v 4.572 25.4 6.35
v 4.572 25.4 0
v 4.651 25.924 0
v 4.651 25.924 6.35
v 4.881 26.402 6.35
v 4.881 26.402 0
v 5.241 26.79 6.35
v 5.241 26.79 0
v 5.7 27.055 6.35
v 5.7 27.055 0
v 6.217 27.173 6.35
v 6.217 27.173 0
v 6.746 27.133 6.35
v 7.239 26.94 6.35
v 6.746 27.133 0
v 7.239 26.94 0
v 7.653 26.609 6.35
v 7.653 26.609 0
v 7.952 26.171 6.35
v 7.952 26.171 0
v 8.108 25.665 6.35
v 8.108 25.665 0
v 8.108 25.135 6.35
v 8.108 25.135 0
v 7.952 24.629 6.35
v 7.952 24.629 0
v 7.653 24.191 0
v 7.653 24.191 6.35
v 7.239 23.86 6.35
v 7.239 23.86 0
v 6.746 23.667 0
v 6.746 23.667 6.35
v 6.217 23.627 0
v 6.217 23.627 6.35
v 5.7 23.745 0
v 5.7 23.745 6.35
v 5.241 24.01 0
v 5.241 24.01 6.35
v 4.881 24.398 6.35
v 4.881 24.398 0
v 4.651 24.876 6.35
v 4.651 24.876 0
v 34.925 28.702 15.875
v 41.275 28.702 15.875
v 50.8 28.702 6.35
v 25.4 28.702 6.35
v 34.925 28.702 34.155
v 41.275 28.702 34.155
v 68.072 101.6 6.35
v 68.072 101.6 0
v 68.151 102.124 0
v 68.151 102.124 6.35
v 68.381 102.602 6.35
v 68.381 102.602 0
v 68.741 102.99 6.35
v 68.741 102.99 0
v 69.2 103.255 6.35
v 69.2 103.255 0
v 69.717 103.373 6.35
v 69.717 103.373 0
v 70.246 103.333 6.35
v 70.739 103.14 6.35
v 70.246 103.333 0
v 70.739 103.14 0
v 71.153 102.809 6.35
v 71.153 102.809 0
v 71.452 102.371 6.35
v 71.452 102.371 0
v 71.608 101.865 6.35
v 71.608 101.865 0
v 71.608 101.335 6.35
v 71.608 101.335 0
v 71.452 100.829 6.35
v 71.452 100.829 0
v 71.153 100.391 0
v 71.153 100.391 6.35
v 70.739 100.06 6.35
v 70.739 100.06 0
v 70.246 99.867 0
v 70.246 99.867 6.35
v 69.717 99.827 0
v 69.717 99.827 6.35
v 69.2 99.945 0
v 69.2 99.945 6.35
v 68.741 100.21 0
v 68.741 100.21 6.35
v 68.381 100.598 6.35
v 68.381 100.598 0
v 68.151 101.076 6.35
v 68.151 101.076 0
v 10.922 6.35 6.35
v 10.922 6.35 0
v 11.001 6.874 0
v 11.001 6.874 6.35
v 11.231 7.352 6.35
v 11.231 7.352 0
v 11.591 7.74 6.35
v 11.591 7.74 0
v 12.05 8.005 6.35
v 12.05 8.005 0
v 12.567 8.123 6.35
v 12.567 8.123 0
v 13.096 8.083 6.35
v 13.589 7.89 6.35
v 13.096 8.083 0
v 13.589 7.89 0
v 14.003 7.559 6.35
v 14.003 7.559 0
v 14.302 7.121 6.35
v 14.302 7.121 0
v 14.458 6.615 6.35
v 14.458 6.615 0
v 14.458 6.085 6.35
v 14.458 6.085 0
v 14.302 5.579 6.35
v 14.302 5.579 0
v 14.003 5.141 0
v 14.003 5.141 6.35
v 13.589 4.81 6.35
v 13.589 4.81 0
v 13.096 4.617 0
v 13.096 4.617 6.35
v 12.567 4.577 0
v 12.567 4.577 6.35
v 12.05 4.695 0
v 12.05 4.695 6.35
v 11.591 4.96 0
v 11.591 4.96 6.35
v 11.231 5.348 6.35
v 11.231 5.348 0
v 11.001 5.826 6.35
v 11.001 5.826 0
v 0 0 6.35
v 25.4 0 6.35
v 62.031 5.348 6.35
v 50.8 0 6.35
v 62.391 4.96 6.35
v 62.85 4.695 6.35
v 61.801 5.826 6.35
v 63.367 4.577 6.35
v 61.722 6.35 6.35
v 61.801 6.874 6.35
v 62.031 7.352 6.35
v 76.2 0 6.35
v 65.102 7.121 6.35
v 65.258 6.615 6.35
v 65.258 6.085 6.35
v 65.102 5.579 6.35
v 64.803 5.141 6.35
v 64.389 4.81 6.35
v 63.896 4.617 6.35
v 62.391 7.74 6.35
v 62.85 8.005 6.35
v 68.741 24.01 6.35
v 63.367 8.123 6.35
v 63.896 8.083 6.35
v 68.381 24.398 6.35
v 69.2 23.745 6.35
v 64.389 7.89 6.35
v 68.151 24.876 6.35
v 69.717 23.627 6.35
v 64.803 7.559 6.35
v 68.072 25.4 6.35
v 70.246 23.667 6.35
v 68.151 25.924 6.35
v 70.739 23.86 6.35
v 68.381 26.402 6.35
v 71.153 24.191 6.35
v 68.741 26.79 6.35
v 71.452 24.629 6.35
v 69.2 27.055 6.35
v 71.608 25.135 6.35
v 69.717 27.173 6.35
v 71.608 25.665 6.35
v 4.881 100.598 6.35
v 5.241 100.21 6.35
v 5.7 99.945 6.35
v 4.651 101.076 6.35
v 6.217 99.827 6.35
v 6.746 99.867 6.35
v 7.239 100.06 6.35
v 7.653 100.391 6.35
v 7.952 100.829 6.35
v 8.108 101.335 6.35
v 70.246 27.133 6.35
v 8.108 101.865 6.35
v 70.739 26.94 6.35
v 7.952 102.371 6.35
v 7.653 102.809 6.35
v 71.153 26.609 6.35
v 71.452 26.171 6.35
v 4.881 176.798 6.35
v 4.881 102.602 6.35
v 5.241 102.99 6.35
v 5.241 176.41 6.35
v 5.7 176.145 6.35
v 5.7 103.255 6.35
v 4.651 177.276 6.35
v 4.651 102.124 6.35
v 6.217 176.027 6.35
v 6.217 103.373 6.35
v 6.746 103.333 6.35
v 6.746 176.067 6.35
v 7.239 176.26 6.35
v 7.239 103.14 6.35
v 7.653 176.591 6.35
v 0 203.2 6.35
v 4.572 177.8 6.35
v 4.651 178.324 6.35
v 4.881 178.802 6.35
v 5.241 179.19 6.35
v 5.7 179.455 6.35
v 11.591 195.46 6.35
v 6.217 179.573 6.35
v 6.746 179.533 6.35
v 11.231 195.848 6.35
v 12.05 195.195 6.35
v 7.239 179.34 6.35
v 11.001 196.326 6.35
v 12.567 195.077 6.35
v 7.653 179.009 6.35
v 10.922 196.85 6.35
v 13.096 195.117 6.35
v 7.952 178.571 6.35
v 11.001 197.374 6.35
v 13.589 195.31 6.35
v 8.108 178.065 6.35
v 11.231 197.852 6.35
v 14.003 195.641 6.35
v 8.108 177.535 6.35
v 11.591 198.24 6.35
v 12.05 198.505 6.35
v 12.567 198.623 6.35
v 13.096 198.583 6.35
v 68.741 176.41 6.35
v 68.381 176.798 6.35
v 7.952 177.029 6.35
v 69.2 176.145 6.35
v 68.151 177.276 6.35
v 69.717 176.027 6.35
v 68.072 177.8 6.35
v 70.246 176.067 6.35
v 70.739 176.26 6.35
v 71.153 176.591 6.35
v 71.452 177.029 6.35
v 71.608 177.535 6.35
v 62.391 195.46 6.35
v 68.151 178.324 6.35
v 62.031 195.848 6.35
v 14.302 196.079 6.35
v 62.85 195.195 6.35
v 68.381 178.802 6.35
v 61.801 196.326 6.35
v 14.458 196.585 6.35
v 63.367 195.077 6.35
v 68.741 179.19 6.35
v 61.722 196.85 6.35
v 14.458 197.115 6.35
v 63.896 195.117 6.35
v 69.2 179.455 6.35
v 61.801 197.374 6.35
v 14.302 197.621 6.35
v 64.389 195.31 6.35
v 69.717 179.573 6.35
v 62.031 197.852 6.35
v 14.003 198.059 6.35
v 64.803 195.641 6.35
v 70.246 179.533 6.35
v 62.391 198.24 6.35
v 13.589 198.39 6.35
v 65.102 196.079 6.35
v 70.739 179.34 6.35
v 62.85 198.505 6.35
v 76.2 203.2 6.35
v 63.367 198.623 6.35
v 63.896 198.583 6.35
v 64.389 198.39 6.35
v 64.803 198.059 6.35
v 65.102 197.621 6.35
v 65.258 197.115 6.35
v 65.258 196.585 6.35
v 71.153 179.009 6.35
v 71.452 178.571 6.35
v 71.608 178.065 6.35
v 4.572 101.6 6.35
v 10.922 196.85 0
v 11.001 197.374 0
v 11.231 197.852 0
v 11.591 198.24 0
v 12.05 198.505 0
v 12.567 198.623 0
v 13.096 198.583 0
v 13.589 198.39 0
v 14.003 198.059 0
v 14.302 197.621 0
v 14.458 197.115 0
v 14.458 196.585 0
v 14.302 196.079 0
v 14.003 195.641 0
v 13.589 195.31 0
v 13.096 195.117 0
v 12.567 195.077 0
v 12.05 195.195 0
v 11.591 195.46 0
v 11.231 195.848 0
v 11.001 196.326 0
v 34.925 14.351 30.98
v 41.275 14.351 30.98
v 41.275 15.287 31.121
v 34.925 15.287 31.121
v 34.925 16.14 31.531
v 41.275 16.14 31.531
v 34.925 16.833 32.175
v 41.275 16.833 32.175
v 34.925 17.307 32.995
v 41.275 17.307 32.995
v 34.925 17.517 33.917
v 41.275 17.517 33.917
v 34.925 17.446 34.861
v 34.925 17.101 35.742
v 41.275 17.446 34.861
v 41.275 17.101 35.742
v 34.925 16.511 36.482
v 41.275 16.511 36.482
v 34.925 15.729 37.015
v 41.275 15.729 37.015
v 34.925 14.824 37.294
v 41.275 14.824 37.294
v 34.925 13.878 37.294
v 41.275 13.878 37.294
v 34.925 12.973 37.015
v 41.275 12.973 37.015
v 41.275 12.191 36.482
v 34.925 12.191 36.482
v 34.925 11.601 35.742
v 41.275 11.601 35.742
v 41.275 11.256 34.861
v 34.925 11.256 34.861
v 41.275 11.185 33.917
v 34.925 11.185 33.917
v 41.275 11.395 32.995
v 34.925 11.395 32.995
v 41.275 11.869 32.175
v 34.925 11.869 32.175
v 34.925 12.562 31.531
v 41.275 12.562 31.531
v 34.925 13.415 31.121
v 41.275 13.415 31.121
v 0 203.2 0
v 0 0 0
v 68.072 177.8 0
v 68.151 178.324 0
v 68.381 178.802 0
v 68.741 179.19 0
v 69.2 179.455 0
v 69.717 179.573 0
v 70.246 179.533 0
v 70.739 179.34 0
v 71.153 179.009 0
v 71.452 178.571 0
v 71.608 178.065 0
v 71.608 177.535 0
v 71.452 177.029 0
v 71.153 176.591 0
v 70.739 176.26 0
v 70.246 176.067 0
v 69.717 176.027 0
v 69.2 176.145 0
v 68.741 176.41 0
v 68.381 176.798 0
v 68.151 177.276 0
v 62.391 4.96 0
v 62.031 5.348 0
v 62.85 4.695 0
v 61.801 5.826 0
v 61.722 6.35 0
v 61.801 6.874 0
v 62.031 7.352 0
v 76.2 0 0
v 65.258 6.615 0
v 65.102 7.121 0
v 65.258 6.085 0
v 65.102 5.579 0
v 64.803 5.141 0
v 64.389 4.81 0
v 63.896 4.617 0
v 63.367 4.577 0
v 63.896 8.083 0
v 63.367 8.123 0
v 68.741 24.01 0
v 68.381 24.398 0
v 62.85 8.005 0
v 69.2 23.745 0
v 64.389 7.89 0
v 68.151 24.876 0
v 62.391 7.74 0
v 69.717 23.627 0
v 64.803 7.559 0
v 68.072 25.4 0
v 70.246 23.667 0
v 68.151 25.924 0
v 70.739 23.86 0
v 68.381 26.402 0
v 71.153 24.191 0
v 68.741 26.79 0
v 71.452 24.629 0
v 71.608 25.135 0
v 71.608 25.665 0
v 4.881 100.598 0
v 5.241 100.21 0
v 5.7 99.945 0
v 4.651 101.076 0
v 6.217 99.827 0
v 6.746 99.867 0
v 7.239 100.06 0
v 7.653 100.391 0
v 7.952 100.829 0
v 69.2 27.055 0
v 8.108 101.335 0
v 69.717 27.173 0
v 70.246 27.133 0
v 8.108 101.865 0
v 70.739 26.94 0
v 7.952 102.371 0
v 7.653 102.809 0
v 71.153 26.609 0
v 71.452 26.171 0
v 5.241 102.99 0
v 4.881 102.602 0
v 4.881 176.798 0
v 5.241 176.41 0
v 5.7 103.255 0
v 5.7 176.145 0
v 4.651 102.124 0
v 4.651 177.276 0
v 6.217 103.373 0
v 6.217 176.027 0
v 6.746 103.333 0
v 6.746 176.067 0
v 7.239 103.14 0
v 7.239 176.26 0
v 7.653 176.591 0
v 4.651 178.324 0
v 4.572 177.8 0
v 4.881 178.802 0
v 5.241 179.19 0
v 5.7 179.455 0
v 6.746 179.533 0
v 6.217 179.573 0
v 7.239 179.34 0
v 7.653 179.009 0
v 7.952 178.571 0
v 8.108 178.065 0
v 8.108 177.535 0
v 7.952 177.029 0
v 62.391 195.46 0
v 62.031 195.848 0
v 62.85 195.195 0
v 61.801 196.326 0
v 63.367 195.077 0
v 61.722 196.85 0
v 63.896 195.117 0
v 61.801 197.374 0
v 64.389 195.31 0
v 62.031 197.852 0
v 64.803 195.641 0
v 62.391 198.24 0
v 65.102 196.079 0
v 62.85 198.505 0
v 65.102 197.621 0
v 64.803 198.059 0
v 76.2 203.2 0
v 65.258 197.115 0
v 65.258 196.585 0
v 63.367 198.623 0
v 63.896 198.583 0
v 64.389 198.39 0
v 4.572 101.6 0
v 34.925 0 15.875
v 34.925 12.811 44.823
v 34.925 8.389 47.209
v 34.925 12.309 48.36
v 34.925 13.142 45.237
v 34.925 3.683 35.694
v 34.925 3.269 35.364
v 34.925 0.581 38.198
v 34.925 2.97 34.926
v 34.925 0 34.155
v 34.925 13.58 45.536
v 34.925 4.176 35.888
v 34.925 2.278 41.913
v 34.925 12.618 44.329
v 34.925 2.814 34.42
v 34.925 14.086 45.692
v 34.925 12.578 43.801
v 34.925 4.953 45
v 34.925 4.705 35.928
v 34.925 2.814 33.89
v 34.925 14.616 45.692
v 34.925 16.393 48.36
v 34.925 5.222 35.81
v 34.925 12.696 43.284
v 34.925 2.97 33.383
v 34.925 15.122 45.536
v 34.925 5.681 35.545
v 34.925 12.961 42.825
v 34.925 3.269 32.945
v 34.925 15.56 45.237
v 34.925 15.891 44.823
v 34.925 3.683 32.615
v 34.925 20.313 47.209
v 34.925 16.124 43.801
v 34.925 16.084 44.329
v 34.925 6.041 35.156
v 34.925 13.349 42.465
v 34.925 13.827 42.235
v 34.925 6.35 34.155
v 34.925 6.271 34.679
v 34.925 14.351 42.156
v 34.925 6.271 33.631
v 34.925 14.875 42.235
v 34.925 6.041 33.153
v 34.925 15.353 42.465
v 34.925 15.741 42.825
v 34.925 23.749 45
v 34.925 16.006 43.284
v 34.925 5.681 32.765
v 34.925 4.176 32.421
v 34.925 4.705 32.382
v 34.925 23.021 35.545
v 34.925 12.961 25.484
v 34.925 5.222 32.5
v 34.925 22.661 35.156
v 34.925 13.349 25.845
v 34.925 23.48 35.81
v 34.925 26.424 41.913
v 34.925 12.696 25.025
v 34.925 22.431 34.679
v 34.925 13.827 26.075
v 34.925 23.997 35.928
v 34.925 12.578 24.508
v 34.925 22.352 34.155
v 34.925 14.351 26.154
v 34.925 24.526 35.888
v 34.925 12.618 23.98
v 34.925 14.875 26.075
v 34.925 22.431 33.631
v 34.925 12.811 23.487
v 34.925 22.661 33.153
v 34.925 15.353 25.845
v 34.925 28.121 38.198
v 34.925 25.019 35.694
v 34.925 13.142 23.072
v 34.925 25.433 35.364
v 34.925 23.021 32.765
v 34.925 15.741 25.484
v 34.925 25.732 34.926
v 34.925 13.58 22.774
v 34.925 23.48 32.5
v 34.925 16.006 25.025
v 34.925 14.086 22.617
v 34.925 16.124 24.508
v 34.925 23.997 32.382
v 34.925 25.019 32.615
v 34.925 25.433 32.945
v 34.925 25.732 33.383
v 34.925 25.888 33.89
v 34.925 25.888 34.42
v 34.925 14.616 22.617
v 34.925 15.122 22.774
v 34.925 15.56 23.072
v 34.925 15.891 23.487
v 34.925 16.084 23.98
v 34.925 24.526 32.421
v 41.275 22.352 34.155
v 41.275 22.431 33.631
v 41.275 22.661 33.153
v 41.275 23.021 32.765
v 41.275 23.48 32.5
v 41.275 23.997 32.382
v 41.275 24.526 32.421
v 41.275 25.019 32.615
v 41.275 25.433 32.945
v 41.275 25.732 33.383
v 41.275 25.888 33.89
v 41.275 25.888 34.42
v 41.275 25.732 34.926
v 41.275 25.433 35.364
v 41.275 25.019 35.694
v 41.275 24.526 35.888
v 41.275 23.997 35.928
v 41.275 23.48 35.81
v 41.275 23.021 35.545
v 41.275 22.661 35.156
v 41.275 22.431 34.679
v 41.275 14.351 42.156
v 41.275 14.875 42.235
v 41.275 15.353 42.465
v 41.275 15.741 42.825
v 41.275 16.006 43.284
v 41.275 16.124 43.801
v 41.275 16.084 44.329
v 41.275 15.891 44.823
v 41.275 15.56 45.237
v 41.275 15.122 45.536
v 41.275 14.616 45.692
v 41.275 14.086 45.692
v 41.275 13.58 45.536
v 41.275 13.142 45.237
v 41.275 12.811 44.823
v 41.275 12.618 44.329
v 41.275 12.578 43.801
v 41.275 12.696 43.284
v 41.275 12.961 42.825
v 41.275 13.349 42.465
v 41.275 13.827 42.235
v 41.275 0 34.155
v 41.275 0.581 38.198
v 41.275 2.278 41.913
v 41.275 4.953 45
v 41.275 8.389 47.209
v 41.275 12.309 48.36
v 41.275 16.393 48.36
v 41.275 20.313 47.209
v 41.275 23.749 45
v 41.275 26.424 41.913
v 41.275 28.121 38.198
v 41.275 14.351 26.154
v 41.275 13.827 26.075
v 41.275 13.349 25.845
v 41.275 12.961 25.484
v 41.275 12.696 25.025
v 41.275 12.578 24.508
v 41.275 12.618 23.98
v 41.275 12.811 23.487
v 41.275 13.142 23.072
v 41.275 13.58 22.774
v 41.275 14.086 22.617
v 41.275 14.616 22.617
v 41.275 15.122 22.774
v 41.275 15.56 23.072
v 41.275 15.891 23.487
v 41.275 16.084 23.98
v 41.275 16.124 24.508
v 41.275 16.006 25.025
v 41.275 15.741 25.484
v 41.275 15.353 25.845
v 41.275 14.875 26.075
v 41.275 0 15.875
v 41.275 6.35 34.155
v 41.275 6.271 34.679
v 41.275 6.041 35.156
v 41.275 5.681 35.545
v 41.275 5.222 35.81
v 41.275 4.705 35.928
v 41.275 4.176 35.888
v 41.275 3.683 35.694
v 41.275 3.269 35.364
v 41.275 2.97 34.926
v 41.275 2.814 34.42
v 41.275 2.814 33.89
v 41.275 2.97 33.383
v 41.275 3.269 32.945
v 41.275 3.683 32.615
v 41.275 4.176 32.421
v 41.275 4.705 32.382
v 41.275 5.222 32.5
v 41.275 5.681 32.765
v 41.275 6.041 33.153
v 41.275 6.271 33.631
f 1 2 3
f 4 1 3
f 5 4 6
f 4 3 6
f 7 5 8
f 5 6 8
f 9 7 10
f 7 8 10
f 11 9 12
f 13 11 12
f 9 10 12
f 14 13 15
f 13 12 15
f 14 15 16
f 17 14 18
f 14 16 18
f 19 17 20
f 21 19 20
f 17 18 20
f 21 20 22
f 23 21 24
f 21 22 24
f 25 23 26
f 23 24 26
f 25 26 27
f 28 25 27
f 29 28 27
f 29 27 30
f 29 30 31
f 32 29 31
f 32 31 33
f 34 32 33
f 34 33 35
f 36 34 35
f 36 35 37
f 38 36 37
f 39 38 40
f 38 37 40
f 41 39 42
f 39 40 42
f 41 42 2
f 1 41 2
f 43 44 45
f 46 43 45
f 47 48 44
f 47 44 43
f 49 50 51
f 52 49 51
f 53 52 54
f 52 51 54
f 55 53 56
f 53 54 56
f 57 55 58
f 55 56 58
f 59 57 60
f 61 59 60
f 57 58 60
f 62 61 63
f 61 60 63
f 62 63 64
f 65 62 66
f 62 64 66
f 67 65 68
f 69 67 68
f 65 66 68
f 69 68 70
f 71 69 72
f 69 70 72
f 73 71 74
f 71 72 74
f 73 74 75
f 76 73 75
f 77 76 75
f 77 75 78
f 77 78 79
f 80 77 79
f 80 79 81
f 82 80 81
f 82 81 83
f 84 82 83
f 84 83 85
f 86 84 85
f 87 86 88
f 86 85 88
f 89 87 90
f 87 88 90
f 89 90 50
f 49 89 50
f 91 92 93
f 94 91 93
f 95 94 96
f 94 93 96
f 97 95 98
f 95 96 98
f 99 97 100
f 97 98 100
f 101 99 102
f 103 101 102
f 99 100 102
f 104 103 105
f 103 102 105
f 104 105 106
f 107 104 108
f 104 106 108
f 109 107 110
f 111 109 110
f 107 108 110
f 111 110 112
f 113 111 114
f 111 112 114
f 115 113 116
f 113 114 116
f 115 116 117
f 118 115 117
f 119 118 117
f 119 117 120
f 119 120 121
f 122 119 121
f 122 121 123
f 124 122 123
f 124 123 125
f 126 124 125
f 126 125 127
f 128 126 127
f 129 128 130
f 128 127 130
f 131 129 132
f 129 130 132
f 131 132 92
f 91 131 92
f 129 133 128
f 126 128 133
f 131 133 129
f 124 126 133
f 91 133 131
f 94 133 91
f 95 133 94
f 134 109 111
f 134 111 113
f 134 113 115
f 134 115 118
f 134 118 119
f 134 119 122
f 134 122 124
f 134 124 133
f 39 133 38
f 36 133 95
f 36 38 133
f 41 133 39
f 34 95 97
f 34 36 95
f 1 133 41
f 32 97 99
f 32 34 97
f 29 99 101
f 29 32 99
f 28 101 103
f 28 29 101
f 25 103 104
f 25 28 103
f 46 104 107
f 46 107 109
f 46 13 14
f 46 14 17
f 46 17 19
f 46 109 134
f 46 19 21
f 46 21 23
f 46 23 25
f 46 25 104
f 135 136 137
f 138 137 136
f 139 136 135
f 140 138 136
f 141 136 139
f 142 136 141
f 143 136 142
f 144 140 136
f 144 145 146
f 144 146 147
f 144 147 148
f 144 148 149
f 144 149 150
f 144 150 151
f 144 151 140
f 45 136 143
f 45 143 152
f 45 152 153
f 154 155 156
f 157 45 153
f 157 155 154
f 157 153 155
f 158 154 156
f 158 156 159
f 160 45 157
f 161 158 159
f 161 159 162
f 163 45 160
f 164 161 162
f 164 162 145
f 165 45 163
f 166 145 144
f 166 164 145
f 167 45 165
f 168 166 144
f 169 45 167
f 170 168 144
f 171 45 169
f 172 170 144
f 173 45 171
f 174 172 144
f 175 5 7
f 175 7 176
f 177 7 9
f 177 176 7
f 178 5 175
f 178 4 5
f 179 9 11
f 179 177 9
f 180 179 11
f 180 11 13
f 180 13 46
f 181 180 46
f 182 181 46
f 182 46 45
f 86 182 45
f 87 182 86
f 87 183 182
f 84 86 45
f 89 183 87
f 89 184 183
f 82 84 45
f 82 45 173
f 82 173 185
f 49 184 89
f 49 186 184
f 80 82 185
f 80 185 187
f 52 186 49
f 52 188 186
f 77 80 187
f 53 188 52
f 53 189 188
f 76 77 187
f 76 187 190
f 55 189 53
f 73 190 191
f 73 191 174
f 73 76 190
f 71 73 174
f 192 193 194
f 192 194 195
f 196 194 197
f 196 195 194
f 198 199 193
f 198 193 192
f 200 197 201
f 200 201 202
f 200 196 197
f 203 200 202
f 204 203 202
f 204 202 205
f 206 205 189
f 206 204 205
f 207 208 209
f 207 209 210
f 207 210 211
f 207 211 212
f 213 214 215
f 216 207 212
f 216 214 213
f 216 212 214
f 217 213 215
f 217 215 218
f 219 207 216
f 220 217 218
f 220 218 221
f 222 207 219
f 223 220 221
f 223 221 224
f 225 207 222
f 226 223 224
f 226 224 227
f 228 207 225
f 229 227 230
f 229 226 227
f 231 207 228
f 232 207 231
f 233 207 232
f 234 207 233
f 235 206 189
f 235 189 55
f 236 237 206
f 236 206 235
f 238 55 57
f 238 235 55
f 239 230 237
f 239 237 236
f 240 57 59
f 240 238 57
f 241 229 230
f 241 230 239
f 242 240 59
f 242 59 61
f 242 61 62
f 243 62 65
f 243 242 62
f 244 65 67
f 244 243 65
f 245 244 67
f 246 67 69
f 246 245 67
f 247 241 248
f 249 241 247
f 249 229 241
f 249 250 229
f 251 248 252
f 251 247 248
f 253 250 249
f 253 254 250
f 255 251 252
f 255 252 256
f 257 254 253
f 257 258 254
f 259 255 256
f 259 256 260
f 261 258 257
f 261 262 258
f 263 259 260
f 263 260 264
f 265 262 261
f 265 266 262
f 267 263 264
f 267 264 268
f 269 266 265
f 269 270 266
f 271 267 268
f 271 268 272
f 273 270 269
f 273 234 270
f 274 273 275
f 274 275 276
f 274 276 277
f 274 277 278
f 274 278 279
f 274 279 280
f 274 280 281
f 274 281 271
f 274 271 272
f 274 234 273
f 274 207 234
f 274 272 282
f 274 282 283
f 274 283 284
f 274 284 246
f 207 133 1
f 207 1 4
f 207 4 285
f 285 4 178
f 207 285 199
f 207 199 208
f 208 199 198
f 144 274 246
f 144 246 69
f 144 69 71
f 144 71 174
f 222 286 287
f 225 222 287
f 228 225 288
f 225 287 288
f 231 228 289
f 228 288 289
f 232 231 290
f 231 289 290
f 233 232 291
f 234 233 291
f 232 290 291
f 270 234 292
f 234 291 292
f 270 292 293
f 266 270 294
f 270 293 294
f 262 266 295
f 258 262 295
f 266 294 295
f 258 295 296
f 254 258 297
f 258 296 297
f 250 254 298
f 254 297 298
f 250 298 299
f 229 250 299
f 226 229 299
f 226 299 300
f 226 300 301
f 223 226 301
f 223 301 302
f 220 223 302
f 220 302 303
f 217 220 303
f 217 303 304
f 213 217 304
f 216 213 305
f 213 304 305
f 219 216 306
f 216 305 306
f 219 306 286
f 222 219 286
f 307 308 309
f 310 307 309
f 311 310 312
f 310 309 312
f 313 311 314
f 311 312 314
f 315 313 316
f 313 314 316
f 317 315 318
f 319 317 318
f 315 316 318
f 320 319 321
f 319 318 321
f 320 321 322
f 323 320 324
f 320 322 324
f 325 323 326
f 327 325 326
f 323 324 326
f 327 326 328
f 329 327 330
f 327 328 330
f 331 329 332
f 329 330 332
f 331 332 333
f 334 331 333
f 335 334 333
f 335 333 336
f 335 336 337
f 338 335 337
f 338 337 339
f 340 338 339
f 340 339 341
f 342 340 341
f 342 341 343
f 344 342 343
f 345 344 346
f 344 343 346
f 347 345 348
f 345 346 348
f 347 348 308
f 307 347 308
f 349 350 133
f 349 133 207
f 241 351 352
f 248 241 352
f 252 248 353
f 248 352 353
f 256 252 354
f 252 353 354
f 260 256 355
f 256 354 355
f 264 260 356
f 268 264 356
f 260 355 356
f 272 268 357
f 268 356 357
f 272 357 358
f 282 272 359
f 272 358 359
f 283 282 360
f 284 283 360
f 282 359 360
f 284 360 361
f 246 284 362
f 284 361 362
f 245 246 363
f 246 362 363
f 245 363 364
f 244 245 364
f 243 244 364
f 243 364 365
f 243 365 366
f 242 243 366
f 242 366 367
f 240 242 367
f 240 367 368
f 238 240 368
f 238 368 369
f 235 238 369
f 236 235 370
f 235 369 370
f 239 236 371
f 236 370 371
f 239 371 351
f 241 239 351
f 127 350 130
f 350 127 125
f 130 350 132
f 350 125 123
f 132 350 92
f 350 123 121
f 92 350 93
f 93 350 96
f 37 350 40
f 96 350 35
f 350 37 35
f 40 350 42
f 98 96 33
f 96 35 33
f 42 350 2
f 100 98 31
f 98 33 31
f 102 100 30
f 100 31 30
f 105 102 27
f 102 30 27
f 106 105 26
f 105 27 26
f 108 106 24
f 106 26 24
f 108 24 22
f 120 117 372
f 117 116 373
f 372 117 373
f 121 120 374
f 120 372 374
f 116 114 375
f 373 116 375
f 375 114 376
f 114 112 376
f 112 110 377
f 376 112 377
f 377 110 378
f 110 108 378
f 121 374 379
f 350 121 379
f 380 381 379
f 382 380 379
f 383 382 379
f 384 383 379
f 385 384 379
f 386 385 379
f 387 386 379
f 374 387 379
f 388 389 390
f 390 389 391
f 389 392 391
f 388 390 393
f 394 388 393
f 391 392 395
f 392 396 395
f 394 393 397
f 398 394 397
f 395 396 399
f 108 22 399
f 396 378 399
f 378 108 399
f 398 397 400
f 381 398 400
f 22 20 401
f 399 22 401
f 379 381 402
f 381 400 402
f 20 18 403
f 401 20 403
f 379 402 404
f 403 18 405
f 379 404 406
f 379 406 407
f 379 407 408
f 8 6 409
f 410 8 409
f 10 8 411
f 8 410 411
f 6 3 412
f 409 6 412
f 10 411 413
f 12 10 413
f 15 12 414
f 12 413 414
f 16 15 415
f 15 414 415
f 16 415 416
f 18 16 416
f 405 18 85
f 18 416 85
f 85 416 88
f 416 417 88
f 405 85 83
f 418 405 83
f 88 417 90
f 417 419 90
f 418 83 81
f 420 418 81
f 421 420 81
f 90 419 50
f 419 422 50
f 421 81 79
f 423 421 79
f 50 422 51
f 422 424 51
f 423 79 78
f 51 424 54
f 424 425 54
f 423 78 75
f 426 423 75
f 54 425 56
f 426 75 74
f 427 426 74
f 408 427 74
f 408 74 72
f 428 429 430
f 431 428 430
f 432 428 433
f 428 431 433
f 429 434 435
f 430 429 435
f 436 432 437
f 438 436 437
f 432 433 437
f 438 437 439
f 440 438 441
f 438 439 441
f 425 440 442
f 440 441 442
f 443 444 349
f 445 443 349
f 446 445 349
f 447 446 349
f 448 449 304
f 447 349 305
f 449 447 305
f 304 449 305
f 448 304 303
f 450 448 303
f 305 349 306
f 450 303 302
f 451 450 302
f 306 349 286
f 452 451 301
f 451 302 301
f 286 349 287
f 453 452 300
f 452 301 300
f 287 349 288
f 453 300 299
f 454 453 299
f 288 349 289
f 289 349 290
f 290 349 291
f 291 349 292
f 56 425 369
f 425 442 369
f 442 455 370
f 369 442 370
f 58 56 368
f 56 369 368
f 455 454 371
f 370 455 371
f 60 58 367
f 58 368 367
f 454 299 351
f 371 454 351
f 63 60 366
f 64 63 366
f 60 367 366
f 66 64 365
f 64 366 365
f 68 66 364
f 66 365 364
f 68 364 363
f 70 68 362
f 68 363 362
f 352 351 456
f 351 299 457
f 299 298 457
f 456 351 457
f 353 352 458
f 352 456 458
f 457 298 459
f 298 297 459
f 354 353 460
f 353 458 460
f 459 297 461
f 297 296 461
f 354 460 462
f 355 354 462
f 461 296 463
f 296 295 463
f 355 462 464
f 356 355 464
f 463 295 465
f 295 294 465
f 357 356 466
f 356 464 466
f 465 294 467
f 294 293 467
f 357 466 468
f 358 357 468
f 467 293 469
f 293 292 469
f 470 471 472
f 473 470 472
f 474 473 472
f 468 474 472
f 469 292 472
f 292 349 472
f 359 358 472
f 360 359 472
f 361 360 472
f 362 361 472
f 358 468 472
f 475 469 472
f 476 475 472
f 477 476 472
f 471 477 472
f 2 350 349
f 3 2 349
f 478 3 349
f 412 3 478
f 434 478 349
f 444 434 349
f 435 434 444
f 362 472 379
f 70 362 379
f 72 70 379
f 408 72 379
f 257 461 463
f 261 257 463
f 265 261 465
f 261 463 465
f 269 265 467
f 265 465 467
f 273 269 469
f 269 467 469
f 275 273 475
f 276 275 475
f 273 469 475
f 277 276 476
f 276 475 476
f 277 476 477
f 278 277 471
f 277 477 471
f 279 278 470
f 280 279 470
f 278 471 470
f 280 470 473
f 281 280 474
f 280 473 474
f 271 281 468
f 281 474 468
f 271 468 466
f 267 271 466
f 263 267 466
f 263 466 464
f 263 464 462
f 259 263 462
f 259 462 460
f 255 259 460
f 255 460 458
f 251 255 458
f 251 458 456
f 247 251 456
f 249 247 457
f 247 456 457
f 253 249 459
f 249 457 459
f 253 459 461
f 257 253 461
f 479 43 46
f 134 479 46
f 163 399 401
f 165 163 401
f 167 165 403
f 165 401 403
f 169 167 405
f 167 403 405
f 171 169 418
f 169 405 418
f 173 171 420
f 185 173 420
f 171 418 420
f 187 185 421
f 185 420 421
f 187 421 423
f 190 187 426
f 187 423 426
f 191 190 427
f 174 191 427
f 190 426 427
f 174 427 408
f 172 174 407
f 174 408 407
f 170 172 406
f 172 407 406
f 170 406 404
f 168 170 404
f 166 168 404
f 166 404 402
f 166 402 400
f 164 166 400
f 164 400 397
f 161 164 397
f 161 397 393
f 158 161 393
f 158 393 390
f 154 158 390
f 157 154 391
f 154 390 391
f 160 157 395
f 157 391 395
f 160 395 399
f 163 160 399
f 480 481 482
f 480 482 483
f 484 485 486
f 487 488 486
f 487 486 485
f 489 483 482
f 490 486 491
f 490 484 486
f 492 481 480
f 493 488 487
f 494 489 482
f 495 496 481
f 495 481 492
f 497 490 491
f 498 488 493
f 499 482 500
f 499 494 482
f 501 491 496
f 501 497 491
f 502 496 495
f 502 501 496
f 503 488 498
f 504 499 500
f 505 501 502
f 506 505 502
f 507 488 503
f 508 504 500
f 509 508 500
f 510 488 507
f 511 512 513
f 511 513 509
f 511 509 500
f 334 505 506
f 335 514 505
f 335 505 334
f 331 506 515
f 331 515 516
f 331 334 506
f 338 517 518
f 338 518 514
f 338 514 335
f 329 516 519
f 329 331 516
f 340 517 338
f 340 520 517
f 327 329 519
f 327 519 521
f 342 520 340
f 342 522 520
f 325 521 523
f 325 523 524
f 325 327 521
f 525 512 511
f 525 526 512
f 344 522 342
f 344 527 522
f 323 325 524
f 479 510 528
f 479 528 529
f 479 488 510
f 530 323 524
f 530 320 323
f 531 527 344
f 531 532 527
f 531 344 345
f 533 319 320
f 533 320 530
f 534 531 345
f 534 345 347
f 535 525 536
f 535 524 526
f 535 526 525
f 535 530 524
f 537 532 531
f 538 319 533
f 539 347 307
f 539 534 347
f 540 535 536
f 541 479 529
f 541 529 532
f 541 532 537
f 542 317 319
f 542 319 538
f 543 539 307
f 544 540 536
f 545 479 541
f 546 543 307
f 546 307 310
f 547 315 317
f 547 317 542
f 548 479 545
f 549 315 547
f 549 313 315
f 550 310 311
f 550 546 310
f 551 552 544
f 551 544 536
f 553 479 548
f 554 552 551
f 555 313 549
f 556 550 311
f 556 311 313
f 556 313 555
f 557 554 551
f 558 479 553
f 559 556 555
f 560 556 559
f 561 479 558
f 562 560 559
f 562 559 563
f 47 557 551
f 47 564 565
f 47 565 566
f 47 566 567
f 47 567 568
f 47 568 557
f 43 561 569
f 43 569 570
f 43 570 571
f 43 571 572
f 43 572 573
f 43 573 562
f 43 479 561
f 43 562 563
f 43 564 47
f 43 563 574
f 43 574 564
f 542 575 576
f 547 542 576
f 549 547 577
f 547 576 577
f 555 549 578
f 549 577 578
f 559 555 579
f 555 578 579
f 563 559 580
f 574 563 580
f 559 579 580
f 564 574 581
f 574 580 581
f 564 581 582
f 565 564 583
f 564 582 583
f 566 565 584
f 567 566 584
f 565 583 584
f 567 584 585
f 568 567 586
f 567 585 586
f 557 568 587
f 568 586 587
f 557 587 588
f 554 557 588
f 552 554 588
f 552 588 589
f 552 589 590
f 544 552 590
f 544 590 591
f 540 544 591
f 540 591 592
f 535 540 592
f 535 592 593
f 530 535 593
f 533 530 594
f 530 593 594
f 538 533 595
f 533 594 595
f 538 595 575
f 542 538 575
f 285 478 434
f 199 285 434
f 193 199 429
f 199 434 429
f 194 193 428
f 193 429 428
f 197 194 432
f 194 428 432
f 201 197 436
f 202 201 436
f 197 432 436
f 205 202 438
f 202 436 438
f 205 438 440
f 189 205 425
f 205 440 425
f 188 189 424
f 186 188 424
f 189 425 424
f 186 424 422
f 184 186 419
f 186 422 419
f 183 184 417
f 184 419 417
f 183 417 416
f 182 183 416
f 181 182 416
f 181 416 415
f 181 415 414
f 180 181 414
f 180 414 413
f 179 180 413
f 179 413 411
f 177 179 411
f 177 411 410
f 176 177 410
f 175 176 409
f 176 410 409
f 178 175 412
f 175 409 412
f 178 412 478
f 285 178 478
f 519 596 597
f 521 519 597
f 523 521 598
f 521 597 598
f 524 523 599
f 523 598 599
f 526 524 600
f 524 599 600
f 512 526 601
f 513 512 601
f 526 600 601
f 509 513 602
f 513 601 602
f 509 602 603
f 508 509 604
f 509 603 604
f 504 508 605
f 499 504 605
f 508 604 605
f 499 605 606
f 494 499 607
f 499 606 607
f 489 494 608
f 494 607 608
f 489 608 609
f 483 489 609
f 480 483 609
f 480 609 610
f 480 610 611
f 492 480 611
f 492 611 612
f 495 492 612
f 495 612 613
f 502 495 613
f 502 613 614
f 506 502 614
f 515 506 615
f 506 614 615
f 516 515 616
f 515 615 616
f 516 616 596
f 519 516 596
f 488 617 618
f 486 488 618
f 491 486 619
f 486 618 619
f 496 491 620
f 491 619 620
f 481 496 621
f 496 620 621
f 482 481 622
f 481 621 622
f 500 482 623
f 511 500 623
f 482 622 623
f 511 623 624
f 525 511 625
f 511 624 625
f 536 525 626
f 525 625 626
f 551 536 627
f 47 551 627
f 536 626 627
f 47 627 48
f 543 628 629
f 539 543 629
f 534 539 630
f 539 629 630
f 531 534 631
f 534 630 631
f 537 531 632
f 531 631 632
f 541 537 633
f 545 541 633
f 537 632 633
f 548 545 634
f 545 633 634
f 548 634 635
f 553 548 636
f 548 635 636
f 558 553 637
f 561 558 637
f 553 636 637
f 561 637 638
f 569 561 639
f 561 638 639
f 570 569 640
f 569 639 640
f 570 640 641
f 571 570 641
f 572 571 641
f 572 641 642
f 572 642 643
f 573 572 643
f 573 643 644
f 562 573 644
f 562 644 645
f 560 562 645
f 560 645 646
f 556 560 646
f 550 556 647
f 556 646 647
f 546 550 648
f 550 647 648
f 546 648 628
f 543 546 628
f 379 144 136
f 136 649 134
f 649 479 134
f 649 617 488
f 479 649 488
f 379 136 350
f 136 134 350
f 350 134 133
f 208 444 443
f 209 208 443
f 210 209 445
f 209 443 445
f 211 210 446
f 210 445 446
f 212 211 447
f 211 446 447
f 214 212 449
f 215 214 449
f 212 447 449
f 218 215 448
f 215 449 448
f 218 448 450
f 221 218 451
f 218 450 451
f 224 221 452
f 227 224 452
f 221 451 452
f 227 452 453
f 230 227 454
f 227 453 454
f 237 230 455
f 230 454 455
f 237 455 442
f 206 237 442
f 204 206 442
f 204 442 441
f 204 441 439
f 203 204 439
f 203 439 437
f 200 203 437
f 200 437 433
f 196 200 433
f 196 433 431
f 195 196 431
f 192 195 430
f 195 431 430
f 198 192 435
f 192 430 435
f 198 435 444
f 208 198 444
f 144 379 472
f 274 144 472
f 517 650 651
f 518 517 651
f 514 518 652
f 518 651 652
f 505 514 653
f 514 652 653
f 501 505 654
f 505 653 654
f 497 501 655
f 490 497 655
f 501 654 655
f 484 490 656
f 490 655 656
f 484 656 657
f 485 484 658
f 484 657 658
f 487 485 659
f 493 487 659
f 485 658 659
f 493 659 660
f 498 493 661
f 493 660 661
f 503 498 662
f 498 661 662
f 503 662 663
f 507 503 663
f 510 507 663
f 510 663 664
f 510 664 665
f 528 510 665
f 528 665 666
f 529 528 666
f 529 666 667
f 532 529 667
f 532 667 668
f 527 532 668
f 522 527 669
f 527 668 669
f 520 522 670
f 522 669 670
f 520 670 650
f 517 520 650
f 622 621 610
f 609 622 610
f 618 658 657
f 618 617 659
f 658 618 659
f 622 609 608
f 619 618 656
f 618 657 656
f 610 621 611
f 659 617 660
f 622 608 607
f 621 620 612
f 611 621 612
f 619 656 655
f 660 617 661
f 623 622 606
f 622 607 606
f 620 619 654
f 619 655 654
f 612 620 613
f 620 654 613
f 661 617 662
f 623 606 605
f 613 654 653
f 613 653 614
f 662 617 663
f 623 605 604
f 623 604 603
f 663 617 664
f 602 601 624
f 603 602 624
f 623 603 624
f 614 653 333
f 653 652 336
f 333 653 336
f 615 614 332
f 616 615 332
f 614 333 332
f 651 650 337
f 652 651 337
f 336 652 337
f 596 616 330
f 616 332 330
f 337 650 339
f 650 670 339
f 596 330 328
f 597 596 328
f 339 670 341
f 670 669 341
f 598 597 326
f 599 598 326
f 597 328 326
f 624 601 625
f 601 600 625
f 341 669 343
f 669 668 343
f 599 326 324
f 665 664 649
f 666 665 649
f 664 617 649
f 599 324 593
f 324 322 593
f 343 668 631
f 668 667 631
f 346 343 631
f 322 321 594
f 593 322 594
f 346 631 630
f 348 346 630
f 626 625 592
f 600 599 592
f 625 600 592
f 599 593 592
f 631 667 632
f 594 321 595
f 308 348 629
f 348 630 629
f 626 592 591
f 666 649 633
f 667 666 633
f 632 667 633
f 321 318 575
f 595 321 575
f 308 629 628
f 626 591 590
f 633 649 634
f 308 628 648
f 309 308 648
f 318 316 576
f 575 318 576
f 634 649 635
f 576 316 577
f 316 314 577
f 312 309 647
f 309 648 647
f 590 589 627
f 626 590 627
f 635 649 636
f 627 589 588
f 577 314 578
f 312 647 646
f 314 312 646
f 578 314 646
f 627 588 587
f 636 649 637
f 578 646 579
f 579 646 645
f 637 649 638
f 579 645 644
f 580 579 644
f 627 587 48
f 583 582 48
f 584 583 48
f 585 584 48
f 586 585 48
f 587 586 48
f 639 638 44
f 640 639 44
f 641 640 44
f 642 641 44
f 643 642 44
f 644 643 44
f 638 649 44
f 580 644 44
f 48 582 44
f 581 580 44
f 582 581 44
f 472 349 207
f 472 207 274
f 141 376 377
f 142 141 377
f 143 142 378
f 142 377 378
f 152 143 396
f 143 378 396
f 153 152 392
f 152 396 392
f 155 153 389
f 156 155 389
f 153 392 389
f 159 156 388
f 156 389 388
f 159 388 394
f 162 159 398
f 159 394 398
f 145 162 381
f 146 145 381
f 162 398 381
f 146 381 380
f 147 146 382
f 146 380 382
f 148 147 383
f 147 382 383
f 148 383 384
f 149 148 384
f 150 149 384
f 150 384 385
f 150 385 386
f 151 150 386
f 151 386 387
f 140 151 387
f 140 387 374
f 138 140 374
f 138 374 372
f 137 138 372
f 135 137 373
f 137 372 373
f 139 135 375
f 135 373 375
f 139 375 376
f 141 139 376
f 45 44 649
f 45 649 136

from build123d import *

# Parameters (mm, degrees)
SKETCH1_W           = 76.2
SKETCH1_H           = 203.2
BOSS_EXTRUDE1_DEPTH = 6.35
SKETCH2_W           = 6.35
SKETCH2_H           = 28.702
BOSS_EXTRUDE2_DEPTH = 44.45
SKETCH3_R           = 3.175
CUT_EXTRUDE1_DEPTH  = 6.35
SKETCH4_R           = 1.778
CUT_EXTRUDE2_DEPTH  = 6.35
CIRPATTERN1_COUNT   = 4
CUT_EXTRUDE3_DEPTH  = 6.35
SKETCH6_R           = 1.778
CUT_EXTRUDE4_DEPTH  = 6.35
BOSS_EXTRUDE3_DEPTH = 28.702


with BuildPart() as part:
    # Sketch1 → Boss-Extrude1 (new body)
    with BuildSketch(Plane.XY):
        with Locations((38.1, 101.6)):
            Rectangle(SKETCH1_W, SKETCH1_H)
    extrude(amount=BOSS_EXTRUDE1_DEPTH)

    # Sketch2 → Boss-Extrude2 (add)
    with BuildSketch(Plane.XY.offset(6.35)):
        with Locations((38.1, 14.351)):
            Rectangle(SKETCH2_W, SKETCH2_H)
    extrude(amount=BOSS_EXTRUDE2_DEPTH)

    # Sketch3 → Cut-Extrude1 (cut)
    with BuildSketch(Plane(origin=(41.275, 0, 0), x_dir=(0, 0, -1), z_dir=(1, 0, 0))):
        with Locations((-34.154615714, 14.351)):
            Circle(SKETCH3_R)
    extrude(amount=-CUT_EXTRUDE1_DEPTH, mode=Mode.SUBTRACT)

    # Sketch4 → Cut-Extrude2 (cut)
    with BuildSketch(Plane(origin=(41.275, 0, 0), x_dir=(0, 0, -1), z_dir=(1, 0, 0))):
        with Locations((-43.933615714, 14.351)):
            Circle(SKETCH4_R)
    cut_extrude2 = extrude(amount=-CUT_EXTRUDE2_DEPTH, mode=Mode.SUBTRACT)

    # CirPattern1: Cut-Extrude2 ×4 about axis
    cirpattern1_axis = Axis((0, 14.351, 34.154615714), (1, 0, 0))
    for i in range(1, CIRPATTERN1_COUNT):
        add(cut_extrude2.rotate(cirpattern1_axis, i * 360 / CIRPATTERN1_COUNT), mode=Mode.SUBTRACT)

    # Sketch5 → Cut-Extrude3 (cut)
    with BuildSketch(Plane(origin=(41.275, 0, 0), x_dir=(0, 0, -1), z_dir=(1, 0, 0))):
        with BuildLine():
            ThreePointArc((-34.154615714, 0), (-48.505615714, 14.351), (-34.154615714, 28.702))
            Line((-34.154615714, 28.702), (-50.8, 28.702))
            Line((-50.8, 28.702), (-50.8, 0))
            Line((-50.8, 0), (-34.154615714, 0))
        make_face()
    extrude(amount=-CUT_EXTRUDE3_DEPTH, mode=Mode.SUBTRACT)

    # Sketch6 → Cut-Extrude4 (cut)
    with BuildSketch(Plane(origin=(0, 0, 0), x_dir=(-1, 0, 0), z_dir=(0, 0, -1))):
        with Locations((-63.5, 6.35)):
            Circle(SKETCH6_R)
        with Locations((-12.7, 6.35)):
            Circle(SKETCH6_R)
        with Locations((-6.35, 177.8)):
            Circle(SKETCH6_R)
        with Locations((-6.35, 25.4)):
            Circle(SKETCH6_R)
        with Locations((-69.85, 25.4)):
            Circle(SKETCH6_R)
        with Locations((-69.85, 177.8)):
            Circle(SKETCH6_R)
        with Locations((-63.5, 196.85)):
            Circle(SKETCH6_R)
        with Locations((-12.7, 196.85)):
            Circle(SKETCH6_R)
        with Locations((-6.35, 101.6)):
            Circle(SKETCH6_R)
        with Locations((-69.85, 101.6)):
            Circle(SKETCH6_R)
    extrude(amount=-CUT_EXTRUDE4_DEPTH, mode=Mode.SUBTRACT)

    # Sketch8 → Boss-Extrude3 (add)
    with BuildSketch(Plane.XZ):
        Polygon((41.275, 6.35), (41.275, 15.875), (50.8, 6.35), align=None)
        Polygon((34.925, 6.35), (34.925, 15.875), (25.4, 6.35), align=None)
    extrude(amount=-BOSS_EXTRUDE3_DEPTH)


solid = part.part
